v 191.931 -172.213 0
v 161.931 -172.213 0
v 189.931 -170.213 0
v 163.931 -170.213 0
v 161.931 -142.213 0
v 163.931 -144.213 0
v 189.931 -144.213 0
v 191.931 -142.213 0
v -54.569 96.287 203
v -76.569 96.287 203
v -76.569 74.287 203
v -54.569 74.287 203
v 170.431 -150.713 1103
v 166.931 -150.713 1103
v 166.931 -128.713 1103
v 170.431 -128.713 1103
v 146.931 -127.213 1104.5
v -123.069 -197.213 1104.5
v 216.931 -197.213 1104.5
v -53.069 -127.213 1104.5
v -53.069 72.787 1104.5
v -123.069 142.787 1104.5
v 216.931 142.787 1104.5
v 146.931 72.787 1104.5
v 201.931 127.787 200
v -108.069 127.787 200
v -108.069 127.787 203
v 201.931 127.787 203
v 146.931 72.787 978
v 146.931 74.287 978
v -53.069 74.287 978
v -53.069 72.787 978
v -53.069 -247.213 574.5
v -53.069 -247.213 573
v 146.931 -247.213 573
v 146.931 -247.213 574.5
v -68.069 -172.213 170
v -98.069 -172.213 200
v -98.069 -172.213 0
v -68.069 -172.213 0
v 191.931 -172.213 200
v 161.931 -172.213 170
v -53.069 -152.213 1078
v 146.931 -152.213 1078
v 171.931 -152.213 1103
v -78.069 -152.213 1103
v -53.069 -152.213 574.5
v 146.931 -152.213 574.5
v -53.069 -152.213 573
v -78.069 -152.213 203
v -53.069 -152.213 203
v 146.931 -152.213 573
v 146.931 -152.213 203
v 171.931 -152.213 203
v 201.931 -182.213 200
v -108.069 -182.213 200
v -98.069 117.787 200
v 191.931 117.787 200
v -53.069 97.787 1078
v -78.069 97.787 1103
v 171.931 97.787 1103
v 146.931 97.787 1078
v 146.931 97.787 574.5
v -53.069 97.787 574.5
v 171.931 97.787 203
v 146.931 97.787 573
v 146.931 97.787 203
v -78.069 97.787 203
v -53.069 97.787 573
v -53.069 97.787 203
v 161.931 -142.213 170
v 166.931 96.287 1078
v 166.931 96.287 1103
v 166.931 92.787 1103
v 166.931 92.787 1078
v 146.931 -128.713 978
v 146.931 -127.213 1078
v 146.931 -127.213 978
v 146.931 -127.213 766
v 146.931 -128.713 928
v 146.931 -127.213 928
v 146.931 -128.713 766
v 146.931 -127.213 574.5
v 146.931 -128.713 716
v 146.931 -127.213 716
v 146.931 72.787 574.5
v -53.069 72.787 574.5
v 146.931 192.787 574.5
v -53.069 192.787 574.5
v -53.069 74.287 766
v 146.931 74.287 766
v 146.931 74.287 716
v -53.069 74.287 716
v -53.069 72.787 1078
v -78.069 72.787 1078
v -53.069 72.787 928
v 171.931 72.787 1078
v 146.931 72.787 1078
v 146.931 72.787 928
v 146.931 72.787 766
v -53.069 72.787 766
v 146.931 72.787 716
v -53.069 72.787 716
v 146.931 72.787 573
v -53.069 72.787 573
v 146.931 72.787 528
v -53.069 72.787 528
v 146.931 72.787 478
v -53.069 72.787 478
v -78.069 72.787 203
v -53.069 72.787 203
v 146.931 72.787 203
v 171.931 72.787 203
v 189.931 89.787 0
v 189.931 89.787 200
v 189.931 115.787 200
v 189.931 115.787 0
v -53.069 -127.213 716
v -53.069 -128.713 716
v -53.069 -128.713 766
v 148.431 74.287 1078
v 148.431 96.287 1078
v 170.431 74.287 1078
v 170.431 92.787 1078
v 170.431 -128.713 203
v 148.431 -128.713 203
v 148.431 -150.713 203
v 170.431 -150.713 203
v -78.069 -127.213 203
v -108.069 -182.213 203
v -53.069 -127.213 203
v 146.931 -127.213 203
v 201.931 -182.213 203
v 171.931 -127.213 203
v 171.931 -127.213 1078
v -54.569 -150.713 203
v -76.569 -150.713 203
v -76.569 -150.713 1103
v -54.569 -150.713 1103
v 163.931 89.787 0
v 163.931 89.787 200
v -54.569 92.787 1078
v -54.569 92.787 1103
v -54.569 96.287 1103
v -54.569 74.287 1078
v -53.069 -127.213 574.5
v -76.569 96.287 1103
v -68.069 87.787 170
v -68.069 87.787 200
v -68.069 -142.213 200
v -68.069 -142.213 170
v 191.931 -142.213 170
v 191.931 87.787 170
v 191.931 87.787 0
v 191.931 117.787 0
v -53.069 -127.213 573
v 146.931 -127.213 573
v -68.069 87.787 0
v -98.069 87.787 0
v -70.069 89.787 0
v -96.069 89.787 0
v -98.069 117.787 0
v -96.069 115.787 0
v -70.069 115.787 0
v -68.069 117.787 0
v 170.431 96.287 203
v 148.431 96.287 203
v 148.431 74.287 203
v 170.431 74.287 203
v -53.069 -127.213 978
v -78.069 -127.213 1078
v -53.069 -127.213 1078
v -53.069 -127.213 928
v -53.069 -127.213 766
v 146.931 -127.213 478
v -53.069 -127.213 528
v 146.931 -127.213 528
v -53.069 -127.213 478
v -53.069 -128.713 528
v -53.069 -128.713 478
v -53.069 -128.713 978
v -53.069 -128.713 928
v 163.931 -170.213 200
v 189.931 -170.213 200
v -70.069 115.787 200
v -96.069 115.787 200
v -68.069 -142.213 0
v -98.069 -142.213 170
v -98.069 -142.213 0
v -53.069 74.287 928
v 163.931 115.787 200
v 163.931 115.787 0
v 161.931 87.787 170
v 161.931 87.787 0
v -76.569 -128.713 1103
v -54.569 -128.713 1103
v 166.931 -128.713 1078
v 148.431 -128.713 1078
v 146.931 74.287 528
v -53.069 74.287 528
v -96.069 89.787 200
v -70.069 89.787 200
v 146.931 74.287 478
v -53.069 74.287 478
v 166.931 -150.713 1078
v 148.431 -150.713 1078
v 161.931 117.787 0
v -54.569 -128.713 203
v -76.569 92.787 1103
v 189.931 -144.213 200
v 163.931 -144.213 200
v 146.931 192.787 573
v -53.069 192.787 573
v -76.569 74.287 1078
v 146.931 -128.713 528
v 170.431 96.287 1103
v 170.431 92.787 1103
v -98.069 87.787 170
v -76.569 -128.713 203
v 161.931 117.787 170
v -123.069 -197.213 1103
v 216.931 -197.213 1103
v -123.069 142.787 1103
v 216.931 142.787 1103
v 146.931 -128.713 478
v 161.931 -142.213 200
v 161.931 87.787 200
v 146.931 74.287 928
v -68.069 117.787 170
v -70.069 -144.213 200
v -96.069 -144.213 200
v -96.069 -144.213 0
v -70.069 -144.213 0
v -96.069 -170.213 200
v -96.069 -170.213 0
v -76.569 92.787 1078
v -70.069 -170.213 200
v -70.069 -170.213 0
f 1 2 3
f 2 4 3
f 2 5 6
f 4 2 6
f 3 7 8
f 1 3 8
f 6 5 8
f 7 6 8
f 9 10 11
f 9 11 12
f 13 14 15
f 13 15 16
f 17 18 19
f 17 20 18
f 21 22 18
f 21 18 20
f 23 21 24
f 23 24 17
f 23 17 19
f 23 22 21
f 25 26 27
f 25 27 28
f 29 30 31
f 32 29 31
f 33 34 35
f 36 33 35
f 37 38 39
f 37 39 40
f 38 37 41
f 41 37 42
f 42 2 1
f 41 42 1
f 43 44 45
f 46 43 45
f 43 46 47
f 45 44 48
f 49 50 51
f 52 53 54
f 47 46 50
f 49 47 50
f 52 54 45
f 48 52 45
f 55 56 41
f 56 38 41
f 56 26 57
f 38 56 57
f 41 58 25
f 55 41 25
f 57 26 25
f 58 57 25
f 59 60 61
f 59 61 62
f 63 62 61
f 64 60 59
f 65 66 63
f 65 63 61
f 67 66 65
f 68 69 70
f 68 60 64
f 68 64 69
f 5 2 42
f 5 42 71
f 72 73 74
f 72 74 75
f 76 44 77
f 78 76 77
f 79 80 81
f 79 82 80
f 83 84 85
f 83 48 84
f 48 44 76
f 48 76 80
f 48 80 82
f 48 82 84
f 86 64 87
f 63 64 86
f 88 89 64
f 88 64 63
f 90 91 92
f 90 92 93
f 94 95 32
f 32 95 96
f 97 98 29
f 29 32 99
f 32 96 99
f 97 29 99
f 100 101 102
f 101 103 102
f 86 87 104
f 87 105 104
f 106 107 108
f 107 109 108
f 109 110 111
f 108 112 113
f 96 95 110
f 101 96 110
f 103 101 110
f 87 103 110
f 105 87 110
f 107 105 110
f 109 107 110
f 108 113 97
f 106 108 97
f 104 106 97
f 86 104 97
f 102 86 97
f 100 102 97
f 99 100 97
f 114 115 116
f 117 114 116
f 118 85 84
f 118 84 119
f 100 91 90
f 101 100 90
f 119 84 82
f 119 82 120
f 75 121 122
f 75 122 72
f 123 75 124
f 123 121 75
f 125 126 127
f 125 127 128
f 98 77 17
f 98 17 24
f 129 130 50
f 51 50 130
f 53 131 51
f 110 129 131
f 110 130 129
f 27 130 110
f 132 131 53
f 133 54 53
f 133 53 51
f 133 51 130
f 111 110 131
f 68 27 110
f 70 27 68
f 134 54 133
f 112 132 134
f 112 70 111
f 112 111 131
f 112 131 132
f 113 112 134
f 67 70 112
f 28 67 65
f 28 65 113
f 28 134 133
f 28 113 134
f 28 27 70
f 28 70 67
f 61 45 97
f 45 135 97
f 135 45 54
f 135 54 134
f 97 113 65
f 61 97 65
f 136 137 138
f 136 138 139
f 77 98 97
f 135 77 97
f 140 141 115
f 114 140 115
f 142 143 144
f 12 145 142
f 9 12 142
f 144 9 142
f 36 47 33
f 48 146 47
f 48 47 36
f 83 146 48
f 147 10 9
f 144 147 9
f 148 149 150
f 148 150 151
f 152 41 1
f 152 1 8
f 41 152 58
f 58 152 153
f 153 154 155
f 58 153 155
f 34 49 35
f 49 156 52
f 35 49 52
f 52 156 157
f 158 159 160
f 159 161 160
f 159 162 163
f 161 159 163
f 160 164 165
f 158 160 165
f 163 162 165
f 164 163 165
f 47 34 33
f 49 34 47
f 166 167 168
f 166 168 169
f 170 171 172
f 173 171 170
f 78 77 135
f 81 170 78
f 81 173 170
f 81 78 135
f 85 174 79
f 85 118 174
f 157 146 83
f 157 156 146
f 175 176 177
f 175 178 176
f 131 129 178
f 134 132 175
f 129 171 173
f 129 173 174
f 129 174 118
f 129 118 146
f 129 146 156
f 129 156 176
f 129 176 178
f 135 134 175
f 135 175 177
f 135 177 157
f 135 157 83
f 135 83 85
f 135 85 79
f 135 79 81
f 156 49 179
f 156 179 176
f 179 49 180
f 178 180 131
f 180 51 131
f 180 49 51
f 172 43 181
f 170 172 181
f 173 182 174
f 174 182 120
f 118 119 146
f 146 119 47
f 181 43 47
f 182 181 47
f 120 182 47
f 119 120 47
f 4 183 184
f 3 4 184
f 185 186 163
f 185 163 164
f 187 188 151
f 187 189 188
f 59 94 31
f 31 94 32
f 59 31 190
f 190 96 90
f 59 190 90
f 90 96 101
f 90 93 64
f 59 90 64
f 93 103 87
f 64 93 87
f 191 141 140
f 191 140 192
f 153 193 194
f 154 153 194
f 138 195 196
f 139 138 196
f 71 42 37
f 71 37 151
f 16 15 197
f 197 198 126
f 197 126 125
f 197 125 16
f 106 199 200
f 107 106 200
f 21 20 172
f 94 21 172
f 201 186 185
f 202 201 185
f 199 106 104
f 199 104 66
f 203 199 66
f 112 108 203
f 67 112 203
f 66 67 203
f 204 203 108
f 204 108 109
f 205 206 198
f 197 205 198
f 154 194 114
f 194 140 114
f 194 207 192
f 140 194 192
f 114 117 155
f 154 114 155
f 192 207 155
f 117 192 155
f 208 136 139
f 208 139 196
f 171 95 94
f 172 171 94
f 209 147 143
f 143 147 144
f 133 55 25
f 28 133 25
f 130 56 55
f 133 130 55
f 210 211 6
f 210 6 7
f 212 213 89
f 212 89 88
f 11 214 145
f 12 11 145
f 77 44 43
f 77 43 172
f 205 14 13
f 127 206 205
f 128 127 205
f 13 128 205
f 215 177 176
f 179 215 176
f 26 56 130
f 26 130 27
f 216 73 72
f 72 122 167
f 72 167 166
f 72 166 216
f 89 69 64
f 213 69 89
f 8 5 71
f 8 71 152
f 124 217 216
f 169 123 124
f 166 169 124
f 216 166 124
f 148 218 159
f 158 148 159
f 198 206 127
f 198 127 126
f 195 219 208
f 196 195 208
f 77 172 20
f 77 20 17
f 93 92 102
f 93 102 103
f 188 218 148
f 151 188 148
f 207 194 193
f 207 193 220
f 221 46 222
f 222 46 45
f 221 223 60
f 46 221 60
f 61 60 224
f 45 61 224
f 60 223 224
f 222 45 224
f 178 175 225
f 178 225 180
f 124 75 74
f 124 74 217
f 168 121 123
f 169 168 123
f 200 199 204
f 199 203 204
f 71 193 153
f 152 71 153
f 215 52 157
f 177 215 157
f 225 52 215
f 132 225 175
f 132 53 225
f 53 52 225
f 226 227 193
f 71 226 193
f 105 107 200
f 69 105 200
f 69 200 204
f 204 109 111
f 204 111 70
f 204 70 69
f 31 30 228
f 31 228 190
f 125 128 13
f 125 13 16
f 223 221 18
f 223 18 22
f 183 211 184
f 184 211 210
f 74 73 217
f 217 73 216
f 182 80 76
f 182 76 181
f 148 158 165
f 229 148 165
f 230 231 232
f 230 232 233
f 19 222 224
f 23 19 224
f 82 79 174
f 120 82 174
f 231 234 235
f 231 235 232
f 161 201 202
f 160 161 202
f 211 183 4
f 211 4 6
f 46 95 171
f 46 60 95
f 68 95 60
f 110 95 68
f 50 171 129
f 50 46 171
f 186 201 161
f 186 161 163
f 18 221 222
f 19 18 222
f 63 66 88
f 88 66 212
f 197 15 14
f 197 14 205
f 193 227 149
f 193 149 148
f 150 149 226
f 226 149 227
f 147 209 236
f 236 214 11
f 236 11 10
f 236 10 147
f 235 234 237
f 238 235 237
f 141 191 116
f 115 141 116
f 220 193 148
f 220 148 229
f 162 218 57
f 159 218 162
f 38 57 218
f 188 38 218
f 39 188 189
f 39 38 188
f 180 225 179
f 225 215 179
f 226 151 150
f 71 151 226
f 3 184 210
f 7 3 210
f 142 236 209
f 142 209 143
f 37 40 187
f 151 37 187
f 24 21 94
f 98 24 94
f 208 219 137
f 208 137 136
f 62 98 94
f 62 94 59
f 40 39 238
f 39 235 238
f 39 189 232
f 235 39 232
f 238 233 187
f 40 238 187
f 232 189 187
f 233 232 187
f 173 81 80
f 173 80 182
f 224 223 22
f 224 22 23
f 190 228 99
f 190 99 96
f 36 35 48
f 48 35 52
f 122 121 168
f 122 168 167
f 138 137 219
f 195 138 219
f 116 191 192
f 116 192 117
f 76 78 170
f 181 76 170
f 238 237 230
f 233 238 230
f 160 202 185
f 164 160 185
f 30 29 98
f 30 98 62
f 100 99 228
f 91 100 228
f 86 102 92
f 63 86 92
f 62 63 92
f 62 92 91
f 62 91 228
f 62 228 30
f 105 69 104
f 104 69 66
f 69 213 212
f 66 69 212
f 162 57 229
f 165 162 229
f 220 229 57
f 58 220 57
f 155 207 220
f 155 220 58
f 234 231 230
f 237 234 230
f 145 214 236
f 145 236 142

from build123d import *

# Parameters (mm, degrees)
SKETCH_1_W        = 30
SKETCH_1_H        = 30
SKETCH_1_W_2      = 26
SKETCH_1_H_2      = 26
EXTRUDE_1_DEPTH   = 200
EXTRUDE_1_2_DEPTH = 200
EXTRUDE_1_3_DEPTH = 200
EXTRUDE_1_4_DEPTH = 200
SKETCH_2_W        = 310
SKETCH_2_H        = 310
EXTRUDE_2_DEPTH   = 3
SKETCH_5_W        = 25
SKETCH_5_H        = 25
SKETCH_5_W_2      = 22
SKETCH_5_H_2      = 22
EXTRUDE_3_DEPTH   = 900
SKETCH_6_W        = 340
SKETCH_6_H        = 340
SKETCH_6_W_2      = 200
SKETCH_6_H_2      = 200
EXTRUDE_4_DEPTH   = 1.5
SKETCH_7_W        = 200
SKETCH_7_H        = 120
EXTRUDE_5_DEPTH   = 1.5
SKETCH_8_W        = 200
SKETCH_8_H        = 1.5
EXTRUDE_6_DEPTH   = 25
SKETCH_9_W        = 200
SKETCH_9_H        = 1.5
EXTRUDE_7_DEPTH   = 25
SKETCH_11_W       = 200
SKETCH_11_H       = 1.5
EXTRUDE_8_DEPTH   = 25
SKETCH_12_W       = 30
SKETCH_12_H       = 30
EXTRUDE_9_DEPTH   = 230
SKETCH_13_W       = 30
SKETCH_13_H       = 30
EXTRUDE_10_DEPTH  = 230
SKETCH_14_W       = 25
SKETCH_14_H       = 25
EXTRUDE_11_DEPTH  = 220
SKETCH_15_W       = 25
SKETCH_15_H       = 25
EXTRUDE_12_DEPTH  = 220


with BuildPart() as part:
    # 草圖1 → 填料-伸長1 (new body)
    with BuildSketch(Plane.XY):
        with Locations((-83.068744212, 102.787427317)):
            Rectangle(SKETCH_1_W, SKETCH_1_H)
        with Locations((-83.068744212, 102.787427317)):
            Rectangle(SKETCH_1_W_2, SKETCH_1_H_2, mode=Mode.SUBTRACT)
    extrude(amount=EXTRUDE_1_DEPTH)



with BuildPart() as body_2:
    # 草圖1 → Extrude 1 2 (new body)
    with BuildSketch(Plane.XY):
        with Locations((176.931255788, 102.787427317)):
            Rectangle(SKETCH_1_W, SKETCH_1_H)
        with Locations((176.931255788, 102.787427317)):
            Rectangle(SKETCH_1_W_2, SKETCH_1_H_2, mode=Mode.SUBTRACT)
    extrude(amount=EXTRUDE_1_2_DEPTH)


with BuildPart() as body_3:
    # 草圖1 → Extrude 1 3 (new body)
    with BuildSketch(Plane.XY):
        with Locations((-83.068744212, -157.212572683)):
            Rectangle(SKETCH_1_W, SKETCH_1_H)
        with Locations((-83.068744212, -157.212572683)):
            Rectangle(SKETCH_1_W_2, SKETCH_1_H_2, mode=Mode.SUBTRACT)
    extrude(amount=EXTRUDE_1_3_DEPTH)


with BuildPart() as body_4:
    # 草圖1 → Extrude 1 4 (new body)
    with BuildSketch(Plane.XY):
        with Locations((176.931255788, -157.212572683)):
            Rectangle(SKETCH_1_W, SKETCH_1_H)
        with Locations((176.931255788, -157.212572683)):
            Rectangle(SKETCH_1_W_2, SKETCH_1_H_2, mode=Mode.SUBTRACT)
    extrude(amount=EXTRUDE_1_4_DEPTH)


with BuildPart() as part_1:
    add(part.part)

    add(body_2.part)  # 填料-伸長2 merges body 2

    add(body_3.part)  # 填料-伸長2 merges body 3

    add(body_4.part)  # 填料-伸長2 merges body 4
    # 草圖2 → 填料-伸長2 (add)
    with BuildSketch(Plane.XY.offset(200)):
        with Locations((46.931255788, -27.212572683)):
            Rectangle(SKETCH_2_W, SKETCH_2_H)
    extrude(amount=EXTRUDE_2_DEPTH)

    # 草圖5 → 填料-伸長3 (add)
    with BuildSketch(Plane.XY.offset(203)):
        with Locations((-65.568744212, 85.287427317)):
            Rectangle(SKETCH_5_W, SKETCH_5_H)
        with Locations((-65.568744212, 85.287427317)):
            Rectangle(SKETCH_5_W_2, SKETCH_5_H_2, mode=Mode.SUBTRACT)
        with Locations((-65.568744212, -139.712572683)):
            Rectangle(SKETCH_5_W, SKETCH_5_H)
        with Locations((-65.568744212, -139.712572683)):
            Rectangle(SKETCH_5_W_2, SKETCH_5_H_2, mode=Mode.SUBTRACT)
        with Locations((159.431255788, -139.712572683)):
            Rectangle(SKETCH_5_W, SKETCH_5_H)
        with Locations((159.431255788, -139.712572683)):
            Rectangle(SKETCH_5_W_2, SKETCH_5_H_2, mode=Mode.SUBTRACT)
        with Locations((159.431255788, 85.287427317)):
            Rectangle(SKETCH_5_W, SKETCH_5_H)
        with Locations((159.431255788, 85.287427317)):
            Rectangle(SKETCH_5_W_2, SKETCH_5_H_2, mode=Mode.SUBTRACT)
    extrude(amount=EXTRUDE_3_DEPTH)

    # 草圖6 → 填料-伸長4 (add)
    with BuildSketch(Plane.XY.offset(1103)):
        with Locations((46.931255788, -27.212572683)):
            Rectangle(SKETCH_6_W, SKETCH_6_H)
        with Locations((46.931255788, -27.212572683)):
            Rectangle(SKETCH_6_W_2, SKETCH_6_H_2, mode=Mode.SUBTRACT)
    extrude(amount=EXTRUDE_4_DEPTH)

    # 草圖7 → 填料-伸長5 (add)
    with BuildSketch(Plane.XY.offset(573)):
        with Locations((46.931255788, 132.787427317)):
            Rectangle(SKETCH_7_W, SKETCH_7_H)
        with Locations((46.931255788, -187.212572683)):
            Rectangle(SKETCH_7_W, SKETCH_7_H)
    extrude(amount=EXTRUDE_5_DEPTH)

    # 草圖8 → 填料-伸長6 (add, symmetric)
    with BuildSketch(Plane(origin=(0, 0, 953), x_dir=(-1, 0, 0), z_dir=(0, 0, -1))):
        with Locations((-46.931255788, 73.537427317)):
            Rectangle(SKETCH_8_W, SKETCH_8_H)
        with Locations((-46.931255788, -127.962572683)):
            Rectangle(SKETCH_8_W, SKETCH_8_H)
    extrude(amount=EXTRUDE_6_DEPTH, both=True)

    # 草圖9 → 填料-伸長7 (add, symmetric)
    with BuildSketch(Plane(origin=(0, 0, 741), x_dir=(-1, 0, 0), z_dir=(0, 0, -1))):
        with Locations((-46.931255788, 73.537427317)):
            Rectangle(SKETCH_9_W, SKETCH_9_H)
        with Locations((-46.931255788, -127.962572683)):
            Rectangle(SKETCH_9_W, SKETCH_9_H)
    extrude(amount=EXTRUDE_7_DEPTH, both=True)

    # 草圖11 → 填料-伸長8 (add, symmetric)
    with BuildSketch(Plane(origin=(0, 0, 503), x_dir=(-1, 0, 0), z_dir=(0, 0, -1))):
        with Locations((-46.931255788, -127.962572683)):
            Rectangle(SKETCH_11_W, SKETCH_11_H)
        with Locations((-46.931255788, 73.537427317)):
            Rectangle(SKETCH_11_W, SKETCH_11_H)
    extrude(amount=EXTRUDE_8_DEPTH, both=True)

    # 草圖12 → 填料-伸長9 (add)
    with BuildSketch(Plane(origin=(-68.068744212, 0, 0), x_dir=(0, 0, -1), z_dir=(1, 0, 0))):
        with Locations((-185, 102.787427317)):
            Rectangle(SKETCH_12_W, SKETCH_12_H)
        with Locations((-185, -157.212572683)):
            Rectangle(SKETCH_12_W, SKETCH_12_H)
    extrude(amount=EXTRUDE_9_DEPTH)

    # 草圖13 → 填料-伸長10 (add)
    with BuildSketch(Plane(origin=(0, -142.212572683, 0), x_dir=(1, 0, 0), z_dir=(0, 1, 0))):
        with Locations((-83.068744212, -185)):
            Rectangle(SKETCH_13_W, SKETCH_13_H)
        with Locations((176.931255788, -185)):
            Rectangle(SKETCH_13_W, SKETCH_13_H)
    extrude(amount=EXTRUDE_10_DEPTH)

    # 草圖14 → 填料-伸長11 (add)
    with BuildSketch(Plane(origin=(0, -127.212572683, 0), x_dir=(1, 0, 0), z_dir=(0, 1, 0))):
        with Locations((-65.568744212, -1090.5)):
            Rectangle(SKETCH_14_W, SKETCH_14_H)
        with Locations((159.431255788, -1090.5)):
            Rectangle(SKETCH_14_W, SKETCH_14_H)
    extrude(amount=EXTRUDE_11_DEPTH)

    # 草圖15 → 填料-伸長12 (add)
    with BuildSketch(Plane(origin=(-53.068744212, 0, 0), x_dir=(0, 0, -1), z_dir=(1, 0, 0))):
        with Locations((-1090.5, 85.287427317)):
            Rectangle(SKETCH_15_W, SKETCH_15_H)
        with Locations((-1090.5, -139.712572683)):
            Rectangle(SKETCH_15_W, SKETCH_15_H)
    extrude(amount=EXTRUDE_12_DEPTH)


solid = part_1.part
